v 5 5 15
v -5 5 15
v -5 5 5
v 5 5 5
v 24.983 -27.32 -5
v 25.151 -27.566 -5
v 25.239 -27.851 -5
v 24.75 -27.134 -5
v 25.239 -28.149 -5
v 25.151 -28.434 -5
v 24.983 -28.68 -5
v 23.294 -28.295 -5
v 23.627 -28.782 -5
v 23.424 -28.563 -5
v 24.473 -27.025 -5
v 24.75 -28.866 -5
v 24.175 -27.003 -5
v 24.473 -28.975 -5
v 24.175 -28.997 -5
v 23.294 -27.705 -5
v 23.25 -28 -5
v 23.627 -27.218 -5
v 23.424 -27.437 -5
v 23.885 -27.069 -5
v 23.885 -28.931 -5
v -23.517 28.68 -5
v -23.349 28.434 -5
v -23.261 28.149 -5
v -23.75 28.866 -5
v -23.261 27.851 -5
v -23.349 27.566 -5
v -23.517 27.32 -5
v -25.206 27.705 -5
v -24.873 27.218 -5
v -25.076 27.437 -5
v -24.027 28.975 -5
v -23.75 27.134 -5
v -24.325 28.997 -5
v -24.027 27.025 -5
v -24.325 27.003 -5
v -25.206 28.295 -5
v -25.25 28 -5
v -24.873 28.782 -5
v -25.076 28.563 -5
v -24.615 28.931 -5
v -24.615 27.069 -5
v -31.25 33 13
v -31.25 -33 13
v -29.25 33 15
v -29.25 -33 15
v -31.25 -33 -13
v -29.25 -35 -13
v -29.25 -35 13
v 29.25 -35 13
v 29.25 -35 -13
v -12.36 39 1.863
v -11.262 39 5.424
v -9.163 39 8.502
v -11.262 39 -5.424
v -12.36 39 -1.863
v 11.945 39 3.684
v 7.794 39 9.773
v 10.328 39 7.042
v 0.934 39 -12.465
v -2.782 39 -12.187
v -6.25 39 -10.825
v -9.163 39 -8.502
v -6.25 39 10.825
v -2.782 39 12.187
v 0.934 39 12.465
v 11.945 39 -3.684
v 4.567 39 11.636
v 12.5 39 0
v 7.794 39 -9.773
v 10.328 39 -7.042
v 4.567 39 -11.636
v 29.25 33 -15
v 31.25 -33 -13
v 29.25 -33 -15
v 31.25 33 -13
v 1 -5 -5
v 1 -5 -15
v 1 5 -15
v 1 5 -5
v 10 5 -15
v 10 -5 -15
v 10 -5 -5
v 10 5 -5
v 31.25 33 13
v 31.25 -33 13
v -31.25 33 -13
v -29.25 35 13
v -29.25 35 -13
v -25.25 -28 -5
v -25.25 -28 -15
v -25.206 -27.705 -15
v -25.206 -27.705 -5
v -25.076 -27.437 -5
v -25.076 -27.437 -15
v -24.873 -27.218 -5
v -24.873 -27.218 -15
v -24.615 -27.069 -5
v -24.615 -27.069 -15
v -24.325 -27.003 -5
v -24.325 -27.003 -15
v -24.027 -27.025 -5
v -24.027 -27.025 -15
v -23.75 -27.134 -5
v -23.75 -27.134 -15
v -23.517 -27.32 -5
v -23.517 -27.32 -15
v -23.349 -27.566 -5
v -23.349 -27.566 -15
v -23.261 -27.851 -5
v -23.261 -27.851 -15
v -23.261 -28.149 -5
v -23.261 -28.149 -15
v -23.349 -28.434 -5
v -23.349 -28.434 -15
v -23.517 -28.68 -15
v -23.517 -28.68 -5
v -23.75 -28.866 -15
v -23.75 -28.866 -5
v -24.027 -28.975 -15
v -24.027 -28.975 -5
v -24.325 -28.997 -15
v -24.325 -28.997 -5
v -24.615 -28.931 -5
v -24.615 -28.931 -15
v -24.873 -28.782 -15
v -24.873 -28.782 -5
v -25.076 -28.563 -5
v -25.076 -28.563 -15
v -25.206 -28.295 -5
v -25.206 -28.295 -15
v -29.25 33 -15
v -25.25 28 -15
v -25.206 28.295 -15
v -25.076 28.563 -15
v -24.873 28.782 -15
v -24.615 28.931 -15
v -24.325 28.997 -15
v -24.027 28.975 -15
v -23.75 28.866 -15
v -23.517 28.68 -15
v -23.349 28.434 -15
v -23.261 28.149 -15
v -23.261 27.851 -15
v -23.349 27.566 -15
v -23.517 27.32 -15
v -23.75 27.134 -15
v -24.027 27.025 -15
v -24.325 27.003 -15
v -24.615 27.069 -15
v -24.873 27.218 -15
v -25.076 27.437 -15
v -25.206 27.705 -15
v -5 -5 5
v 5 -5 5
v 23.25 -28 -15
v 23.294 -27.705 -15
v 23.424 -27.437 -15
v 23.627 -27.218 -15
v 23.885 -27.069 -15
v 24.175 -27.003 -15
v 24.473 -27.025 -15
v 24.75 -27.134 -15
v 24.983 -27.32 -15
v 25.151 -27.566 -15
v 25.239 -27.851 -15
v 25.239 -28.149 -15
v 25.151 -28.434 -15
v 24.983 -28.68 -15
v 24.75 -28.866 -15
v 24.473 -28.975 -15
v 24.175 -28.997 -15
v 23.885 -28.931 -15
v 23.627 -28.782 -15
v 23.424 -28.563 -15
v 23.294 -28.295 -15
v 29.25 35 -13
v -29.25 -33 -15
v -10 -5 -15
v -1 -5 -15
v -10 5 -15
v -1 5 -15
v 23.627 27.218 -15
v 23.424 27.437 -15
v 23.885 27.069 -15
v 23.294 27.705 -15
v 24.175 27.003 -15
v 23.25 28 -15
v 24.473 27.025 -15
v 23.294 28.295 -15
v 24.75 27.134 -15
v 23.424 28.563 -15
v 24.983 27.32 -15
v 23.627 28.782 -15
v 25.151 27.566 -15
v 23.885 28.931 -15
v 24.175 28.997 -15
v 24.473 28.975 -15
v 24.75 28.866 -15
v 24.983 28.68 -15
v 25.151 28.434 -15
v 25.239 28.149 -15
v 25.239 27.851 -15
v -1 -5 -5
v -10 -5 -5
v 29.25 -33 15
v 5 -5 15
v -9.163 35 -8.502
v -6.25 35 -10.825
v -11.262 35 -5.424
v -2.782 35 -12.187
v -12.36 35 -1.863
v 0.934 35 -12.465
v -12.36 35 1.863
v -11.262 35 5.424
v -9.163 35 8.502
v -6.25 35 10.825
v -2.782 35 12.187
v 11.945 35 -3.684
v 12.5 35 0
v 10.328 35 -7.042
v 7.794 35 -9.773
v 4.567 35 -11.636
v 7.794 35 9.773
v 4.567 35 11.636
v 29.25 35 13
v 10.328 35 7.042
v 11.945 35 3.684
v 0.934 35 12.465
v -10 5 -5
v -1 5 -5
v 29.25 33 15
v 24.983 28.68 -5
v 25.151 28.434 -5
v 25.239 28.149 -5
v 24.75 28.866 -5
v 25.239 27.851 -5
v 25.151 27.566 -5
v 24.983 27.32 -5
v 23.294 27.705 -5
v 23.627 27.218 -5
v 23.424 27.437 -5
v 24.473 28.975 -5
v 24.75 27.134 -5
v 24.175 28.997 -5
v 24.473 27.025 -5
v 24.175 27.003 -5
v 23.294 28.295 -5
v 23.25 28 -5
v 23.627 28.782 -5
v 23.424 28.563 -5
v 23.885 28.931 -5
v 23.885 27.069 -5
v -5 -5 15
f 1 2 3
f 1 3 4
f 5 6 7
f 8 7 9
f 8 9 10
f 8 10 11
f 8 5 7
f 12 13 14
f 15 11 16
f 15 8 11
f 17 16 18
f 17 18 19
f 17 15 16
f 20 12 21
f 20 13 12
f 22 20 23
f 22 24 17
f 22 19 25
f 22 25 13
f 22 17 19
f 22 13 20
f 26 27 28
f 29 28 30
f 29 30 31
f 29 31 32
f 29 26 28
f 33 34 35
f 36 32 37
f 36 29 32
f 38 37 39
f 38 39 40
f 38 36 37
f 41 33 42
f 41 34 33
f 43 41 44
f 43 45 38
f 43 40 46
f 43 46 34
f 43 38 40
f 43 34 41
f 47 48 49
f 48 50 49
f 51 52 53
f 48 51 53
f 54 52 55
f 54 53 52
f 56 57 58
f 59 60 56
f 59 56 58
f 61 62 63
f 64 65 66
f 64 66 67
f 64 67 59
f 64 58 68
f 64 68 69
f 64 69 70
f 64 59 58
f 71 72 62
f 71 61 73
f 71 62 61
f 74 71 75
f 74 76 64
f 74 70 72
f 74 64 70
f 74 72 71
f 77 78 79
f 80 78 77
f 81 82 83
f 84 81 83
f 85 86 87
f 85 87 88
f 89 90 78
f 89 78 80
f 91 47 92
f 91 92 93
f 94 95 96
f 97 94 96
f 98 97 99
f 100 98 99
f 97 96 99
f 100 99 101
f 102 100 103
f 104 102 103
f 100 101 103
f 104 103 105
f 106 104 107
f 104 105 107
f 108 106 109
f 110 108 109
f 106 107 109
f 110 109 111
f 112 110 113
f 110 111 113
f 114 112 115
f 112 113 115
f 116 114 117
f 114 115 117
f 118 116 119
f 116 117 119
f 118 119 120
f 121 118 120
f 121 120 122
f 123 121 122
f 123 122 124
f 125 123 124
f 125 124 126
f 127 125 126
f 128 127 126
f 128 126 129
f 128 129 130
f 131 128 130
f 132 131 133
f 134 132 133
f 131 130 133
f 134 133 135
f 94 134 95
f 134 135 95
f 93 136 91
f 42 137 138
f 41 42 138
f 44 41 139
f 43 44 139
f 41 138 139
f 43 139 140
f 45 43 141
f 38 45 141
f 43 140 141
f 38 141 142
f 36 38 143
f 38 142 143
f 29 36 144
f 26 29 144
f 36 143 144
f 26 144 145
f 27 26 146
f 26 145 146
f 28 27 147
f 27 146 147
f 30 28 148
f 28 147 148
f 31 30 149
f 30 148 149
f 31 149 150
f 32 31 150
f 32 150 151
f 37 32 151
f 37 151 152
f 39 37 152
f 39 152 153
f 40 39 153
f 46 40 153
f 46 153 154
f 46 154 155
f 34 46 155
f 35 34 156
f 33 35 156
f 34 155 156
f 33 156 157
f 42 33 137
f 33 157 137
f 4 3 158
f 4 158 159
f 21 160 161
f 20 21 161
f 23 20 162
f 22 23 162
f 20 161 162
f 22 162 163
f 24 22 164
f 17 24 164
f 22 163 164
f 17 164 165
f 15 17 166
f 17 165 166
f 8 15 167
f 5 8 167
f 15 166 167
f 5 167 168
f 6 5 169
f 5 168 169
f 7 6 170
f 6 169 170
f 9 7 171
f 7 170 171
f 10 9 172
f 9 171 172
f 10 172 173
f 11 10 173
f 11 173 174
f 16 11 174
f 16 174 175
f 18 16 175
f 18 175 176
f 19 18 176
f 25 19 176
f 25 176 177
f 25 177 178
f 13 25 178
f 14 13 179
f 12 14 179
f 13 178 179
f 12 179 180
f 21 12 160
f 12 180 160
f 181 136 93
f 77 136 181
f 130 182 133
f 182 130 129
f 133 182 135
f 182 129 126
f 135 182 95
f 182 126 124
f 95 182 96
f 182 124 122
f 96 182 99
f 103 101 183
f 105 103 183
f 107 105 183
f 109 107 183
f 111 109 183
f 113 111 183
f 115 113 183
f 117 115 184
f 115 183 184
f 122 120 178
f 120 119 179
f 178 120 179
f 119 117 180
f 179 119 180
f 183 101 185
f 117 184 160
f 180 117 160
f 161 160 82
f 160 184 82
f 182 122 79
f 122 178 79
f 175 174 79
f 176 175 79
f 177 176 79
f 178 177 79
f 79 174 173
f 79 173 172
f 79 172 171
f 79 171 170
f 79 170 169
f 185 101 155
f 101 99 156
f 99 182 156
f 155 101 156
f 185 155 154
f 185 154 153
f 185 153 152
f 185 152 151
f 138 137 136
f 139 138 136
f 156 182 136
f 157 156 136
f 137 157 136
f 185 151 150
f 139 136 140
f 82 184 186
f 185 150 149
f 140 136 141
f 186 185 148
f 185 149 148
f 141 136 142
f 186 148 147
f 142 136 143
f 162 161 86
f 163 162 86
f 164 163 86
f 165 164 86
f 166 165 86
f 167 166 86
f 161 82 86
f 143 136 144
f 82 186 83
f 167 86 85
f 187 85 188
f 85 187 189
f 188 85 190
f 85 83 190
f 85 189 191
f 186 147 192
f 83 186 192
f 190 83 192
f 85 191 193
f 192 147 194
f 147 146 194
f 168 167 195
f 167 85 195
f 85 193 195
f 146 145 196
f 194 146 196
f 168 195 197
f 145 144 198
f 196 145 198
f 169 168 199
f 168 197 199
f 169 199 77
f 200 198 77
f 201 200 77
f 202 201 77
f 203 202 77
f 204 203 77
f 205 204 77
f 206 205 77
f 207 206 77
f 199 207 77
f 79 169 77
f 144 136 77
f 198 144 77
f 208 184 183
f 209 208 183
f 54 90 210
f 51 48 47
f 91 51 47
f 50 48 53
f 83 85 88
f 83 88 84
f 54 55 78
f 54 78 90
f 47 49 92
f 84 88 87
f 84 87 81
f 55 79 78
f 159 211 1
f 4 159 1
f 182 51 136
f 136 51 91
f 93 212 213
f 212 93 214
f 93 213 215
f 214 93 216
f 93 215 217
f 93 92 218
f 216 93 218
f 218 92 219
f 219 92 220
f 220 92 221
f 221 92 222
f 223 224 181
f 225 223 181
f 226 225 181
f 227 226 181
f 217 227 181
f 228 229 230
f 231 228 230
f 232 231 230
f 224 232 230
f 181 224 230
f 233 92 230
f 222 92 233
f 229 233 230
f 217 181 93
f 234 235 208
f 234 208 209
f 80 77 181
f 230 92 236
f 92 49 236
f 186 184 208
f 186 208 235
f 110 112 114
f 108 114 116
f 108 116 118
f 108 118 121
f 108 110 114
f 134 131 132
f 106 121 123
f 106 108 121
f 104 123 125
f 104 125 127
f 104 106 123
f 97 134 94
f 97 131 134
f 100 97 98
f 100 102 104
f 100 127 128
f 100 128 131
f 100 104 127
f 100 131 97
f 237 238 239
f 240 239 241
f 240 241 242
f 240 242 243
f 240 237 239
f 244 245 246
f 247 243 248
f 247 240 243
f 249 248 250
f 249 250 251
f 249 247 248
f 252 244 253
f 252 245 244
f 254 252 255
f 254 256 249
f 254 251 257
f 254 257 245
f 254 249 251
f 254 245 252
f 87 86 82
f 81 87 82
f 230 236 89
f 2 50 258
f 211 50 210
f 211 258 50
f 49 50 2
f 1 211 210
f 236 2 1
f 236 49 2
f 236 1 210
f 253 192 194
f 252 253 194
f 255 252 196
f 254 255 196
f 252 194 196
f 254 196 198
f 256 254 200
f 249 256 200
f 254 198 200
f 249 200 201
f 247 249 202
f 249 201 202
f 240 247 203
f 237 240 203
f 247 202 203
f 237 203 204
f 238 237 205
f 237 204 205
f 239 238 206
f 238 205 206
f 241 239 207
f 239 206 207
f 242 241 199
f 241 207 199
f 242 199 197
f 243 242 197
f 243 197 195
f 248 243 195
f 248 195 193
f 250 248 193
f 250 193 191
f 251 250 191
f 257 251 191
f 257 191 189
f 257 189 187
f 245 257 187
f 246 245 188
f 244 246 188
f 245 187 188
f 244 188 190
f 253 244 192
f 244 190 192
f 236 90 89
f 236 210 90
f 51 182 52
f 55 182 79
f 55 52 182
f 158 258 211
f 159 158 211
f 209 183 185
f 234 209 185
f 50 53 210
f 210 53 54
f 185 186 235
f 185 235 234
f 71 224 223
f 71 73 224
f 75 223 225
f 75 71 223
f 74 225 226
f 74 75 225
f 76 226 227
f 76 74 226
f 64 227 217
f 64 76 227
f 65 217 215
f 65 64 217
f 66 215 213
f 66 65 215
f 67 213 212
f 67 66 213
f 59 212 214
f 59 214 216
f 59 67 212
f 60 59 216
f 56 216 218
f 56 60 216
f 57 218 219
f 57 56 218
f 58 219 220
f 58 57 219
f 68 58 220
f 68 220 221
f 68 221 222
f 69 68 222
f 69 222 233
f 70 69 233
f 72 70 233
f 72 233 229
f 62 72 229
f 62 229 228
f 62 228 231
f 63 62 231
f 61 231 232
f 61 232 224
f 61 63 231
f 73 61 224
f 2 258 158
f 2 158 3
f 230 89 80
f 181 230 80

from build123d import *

# Parameters (mm, degrees)
SKETCH1_W           = 62.5
SKETCH1_H           = 70
BOSS_EXTRUDE1_DEPTH = 15
SKETCH2_R           = 12.5
BOSS_EXTRUDE2_DEPTH = 4
CHAMFER1_SIZE       = 2
SKETCH3_R           = 1
CUT_EXTRUDE1_DEPTH  = 10
SKETCH4_W           = 10
SKETCH4_H           = 10
CUT_EXTRUDE2_DEPTH  = 10
SKETCH5_W           = 9
SKETCH5_H           = 10
CUT_EXTRUDE3_DEPTH  = 10


with BuildPart() as part:
    # Sketch1 → Boss-Extrude1 (new, symmetric)
    with BuildSketch(Plane.XY):
        Rectangle(SKETCH1_W, SKETCH1_H)
    extrude(amount=BOSS_EXTRUDE1_DEPTH, both=True)

    # Sketch2 → Boss-Extrude2 (add, symmetric)
    with BuildSketch(Plane(origin=(0, 35, 0), x_dir=(1, 0, 0), z_dir=(0, 1, 0))):
        Circle(SKETCH2_R)
    extrude(amount=BOSS_EXTRUDE2_DEPTH, both=True)

    # Chamfer1
    chamfer1_edges = [part.edges().sort_by_distance(p)[0] for p in [
        (31.25, 0, 15),
        (0, 35, 15),
        (-31.25, 0, 15),
        (0, 35, -15),
        (31.25, 0, -15),
        (0, -35, -15),
        (-31.25, 0, -15),
        (-31.25, 35, 0),
        (31.25, 35, 0),
        (31.25, -35, 0),
        (-31.25, -35, 0),
        (0, -35, 15),
    ]]
    chamfer(chamfer1_edges, length=CHAMFER1_SIZE)

    # Sketch3 → Cut-Extrude1 (cut)
    with BuildSketch(Plane(origin=(0, 0, -15), x_dir=(-1, 0, 0), z_dir=(0, 0, -1))):
        with Locations((-24.25, 28)):
            Circle(SKETCH3_R)
        with Locations((24.25, 28)):
            Circle(SKETCH3_R)
        with Locations((-24.25, -28)):
            Circle(SKETCH3_R)
        with Locations((24.25, -28)):
            Circle(SKETCH3_R)
    extrude(amount=-CUT_EXTRUDE1_DEPTH, mode=Mode.SUBTRACT)

    # Sketch4 → Cut-Extrude2 (cut)
    with BuildSketch(Plane.XY.offset(15)):
        Rectangle(SKETCH4_W, SKETCH4_H)
    extrude(amount=-CUT_EXTRUDE2_DEPTH, mode=Mode.SUBTRACT)

    # Sketch5 → Cut-Extrude3 (cut)
    with BuildSketch(Plane(origin=(0, 0, -15), x_dir=(-1, 0, 0), z_dir=(0, 0, -1))):
        with Locations((5.5, 0)):
            Rectangle(SKETCH5_W, SKETCH5_H)
        with Locations((-5.5, 0)):
            Rectangle(SKETCH5_W, SKETCH5_H)
    extrude(amount=-CUT_EXTRUDE3_DEPTH, mode=Mode.SUBTRACT)


solid = part.part
